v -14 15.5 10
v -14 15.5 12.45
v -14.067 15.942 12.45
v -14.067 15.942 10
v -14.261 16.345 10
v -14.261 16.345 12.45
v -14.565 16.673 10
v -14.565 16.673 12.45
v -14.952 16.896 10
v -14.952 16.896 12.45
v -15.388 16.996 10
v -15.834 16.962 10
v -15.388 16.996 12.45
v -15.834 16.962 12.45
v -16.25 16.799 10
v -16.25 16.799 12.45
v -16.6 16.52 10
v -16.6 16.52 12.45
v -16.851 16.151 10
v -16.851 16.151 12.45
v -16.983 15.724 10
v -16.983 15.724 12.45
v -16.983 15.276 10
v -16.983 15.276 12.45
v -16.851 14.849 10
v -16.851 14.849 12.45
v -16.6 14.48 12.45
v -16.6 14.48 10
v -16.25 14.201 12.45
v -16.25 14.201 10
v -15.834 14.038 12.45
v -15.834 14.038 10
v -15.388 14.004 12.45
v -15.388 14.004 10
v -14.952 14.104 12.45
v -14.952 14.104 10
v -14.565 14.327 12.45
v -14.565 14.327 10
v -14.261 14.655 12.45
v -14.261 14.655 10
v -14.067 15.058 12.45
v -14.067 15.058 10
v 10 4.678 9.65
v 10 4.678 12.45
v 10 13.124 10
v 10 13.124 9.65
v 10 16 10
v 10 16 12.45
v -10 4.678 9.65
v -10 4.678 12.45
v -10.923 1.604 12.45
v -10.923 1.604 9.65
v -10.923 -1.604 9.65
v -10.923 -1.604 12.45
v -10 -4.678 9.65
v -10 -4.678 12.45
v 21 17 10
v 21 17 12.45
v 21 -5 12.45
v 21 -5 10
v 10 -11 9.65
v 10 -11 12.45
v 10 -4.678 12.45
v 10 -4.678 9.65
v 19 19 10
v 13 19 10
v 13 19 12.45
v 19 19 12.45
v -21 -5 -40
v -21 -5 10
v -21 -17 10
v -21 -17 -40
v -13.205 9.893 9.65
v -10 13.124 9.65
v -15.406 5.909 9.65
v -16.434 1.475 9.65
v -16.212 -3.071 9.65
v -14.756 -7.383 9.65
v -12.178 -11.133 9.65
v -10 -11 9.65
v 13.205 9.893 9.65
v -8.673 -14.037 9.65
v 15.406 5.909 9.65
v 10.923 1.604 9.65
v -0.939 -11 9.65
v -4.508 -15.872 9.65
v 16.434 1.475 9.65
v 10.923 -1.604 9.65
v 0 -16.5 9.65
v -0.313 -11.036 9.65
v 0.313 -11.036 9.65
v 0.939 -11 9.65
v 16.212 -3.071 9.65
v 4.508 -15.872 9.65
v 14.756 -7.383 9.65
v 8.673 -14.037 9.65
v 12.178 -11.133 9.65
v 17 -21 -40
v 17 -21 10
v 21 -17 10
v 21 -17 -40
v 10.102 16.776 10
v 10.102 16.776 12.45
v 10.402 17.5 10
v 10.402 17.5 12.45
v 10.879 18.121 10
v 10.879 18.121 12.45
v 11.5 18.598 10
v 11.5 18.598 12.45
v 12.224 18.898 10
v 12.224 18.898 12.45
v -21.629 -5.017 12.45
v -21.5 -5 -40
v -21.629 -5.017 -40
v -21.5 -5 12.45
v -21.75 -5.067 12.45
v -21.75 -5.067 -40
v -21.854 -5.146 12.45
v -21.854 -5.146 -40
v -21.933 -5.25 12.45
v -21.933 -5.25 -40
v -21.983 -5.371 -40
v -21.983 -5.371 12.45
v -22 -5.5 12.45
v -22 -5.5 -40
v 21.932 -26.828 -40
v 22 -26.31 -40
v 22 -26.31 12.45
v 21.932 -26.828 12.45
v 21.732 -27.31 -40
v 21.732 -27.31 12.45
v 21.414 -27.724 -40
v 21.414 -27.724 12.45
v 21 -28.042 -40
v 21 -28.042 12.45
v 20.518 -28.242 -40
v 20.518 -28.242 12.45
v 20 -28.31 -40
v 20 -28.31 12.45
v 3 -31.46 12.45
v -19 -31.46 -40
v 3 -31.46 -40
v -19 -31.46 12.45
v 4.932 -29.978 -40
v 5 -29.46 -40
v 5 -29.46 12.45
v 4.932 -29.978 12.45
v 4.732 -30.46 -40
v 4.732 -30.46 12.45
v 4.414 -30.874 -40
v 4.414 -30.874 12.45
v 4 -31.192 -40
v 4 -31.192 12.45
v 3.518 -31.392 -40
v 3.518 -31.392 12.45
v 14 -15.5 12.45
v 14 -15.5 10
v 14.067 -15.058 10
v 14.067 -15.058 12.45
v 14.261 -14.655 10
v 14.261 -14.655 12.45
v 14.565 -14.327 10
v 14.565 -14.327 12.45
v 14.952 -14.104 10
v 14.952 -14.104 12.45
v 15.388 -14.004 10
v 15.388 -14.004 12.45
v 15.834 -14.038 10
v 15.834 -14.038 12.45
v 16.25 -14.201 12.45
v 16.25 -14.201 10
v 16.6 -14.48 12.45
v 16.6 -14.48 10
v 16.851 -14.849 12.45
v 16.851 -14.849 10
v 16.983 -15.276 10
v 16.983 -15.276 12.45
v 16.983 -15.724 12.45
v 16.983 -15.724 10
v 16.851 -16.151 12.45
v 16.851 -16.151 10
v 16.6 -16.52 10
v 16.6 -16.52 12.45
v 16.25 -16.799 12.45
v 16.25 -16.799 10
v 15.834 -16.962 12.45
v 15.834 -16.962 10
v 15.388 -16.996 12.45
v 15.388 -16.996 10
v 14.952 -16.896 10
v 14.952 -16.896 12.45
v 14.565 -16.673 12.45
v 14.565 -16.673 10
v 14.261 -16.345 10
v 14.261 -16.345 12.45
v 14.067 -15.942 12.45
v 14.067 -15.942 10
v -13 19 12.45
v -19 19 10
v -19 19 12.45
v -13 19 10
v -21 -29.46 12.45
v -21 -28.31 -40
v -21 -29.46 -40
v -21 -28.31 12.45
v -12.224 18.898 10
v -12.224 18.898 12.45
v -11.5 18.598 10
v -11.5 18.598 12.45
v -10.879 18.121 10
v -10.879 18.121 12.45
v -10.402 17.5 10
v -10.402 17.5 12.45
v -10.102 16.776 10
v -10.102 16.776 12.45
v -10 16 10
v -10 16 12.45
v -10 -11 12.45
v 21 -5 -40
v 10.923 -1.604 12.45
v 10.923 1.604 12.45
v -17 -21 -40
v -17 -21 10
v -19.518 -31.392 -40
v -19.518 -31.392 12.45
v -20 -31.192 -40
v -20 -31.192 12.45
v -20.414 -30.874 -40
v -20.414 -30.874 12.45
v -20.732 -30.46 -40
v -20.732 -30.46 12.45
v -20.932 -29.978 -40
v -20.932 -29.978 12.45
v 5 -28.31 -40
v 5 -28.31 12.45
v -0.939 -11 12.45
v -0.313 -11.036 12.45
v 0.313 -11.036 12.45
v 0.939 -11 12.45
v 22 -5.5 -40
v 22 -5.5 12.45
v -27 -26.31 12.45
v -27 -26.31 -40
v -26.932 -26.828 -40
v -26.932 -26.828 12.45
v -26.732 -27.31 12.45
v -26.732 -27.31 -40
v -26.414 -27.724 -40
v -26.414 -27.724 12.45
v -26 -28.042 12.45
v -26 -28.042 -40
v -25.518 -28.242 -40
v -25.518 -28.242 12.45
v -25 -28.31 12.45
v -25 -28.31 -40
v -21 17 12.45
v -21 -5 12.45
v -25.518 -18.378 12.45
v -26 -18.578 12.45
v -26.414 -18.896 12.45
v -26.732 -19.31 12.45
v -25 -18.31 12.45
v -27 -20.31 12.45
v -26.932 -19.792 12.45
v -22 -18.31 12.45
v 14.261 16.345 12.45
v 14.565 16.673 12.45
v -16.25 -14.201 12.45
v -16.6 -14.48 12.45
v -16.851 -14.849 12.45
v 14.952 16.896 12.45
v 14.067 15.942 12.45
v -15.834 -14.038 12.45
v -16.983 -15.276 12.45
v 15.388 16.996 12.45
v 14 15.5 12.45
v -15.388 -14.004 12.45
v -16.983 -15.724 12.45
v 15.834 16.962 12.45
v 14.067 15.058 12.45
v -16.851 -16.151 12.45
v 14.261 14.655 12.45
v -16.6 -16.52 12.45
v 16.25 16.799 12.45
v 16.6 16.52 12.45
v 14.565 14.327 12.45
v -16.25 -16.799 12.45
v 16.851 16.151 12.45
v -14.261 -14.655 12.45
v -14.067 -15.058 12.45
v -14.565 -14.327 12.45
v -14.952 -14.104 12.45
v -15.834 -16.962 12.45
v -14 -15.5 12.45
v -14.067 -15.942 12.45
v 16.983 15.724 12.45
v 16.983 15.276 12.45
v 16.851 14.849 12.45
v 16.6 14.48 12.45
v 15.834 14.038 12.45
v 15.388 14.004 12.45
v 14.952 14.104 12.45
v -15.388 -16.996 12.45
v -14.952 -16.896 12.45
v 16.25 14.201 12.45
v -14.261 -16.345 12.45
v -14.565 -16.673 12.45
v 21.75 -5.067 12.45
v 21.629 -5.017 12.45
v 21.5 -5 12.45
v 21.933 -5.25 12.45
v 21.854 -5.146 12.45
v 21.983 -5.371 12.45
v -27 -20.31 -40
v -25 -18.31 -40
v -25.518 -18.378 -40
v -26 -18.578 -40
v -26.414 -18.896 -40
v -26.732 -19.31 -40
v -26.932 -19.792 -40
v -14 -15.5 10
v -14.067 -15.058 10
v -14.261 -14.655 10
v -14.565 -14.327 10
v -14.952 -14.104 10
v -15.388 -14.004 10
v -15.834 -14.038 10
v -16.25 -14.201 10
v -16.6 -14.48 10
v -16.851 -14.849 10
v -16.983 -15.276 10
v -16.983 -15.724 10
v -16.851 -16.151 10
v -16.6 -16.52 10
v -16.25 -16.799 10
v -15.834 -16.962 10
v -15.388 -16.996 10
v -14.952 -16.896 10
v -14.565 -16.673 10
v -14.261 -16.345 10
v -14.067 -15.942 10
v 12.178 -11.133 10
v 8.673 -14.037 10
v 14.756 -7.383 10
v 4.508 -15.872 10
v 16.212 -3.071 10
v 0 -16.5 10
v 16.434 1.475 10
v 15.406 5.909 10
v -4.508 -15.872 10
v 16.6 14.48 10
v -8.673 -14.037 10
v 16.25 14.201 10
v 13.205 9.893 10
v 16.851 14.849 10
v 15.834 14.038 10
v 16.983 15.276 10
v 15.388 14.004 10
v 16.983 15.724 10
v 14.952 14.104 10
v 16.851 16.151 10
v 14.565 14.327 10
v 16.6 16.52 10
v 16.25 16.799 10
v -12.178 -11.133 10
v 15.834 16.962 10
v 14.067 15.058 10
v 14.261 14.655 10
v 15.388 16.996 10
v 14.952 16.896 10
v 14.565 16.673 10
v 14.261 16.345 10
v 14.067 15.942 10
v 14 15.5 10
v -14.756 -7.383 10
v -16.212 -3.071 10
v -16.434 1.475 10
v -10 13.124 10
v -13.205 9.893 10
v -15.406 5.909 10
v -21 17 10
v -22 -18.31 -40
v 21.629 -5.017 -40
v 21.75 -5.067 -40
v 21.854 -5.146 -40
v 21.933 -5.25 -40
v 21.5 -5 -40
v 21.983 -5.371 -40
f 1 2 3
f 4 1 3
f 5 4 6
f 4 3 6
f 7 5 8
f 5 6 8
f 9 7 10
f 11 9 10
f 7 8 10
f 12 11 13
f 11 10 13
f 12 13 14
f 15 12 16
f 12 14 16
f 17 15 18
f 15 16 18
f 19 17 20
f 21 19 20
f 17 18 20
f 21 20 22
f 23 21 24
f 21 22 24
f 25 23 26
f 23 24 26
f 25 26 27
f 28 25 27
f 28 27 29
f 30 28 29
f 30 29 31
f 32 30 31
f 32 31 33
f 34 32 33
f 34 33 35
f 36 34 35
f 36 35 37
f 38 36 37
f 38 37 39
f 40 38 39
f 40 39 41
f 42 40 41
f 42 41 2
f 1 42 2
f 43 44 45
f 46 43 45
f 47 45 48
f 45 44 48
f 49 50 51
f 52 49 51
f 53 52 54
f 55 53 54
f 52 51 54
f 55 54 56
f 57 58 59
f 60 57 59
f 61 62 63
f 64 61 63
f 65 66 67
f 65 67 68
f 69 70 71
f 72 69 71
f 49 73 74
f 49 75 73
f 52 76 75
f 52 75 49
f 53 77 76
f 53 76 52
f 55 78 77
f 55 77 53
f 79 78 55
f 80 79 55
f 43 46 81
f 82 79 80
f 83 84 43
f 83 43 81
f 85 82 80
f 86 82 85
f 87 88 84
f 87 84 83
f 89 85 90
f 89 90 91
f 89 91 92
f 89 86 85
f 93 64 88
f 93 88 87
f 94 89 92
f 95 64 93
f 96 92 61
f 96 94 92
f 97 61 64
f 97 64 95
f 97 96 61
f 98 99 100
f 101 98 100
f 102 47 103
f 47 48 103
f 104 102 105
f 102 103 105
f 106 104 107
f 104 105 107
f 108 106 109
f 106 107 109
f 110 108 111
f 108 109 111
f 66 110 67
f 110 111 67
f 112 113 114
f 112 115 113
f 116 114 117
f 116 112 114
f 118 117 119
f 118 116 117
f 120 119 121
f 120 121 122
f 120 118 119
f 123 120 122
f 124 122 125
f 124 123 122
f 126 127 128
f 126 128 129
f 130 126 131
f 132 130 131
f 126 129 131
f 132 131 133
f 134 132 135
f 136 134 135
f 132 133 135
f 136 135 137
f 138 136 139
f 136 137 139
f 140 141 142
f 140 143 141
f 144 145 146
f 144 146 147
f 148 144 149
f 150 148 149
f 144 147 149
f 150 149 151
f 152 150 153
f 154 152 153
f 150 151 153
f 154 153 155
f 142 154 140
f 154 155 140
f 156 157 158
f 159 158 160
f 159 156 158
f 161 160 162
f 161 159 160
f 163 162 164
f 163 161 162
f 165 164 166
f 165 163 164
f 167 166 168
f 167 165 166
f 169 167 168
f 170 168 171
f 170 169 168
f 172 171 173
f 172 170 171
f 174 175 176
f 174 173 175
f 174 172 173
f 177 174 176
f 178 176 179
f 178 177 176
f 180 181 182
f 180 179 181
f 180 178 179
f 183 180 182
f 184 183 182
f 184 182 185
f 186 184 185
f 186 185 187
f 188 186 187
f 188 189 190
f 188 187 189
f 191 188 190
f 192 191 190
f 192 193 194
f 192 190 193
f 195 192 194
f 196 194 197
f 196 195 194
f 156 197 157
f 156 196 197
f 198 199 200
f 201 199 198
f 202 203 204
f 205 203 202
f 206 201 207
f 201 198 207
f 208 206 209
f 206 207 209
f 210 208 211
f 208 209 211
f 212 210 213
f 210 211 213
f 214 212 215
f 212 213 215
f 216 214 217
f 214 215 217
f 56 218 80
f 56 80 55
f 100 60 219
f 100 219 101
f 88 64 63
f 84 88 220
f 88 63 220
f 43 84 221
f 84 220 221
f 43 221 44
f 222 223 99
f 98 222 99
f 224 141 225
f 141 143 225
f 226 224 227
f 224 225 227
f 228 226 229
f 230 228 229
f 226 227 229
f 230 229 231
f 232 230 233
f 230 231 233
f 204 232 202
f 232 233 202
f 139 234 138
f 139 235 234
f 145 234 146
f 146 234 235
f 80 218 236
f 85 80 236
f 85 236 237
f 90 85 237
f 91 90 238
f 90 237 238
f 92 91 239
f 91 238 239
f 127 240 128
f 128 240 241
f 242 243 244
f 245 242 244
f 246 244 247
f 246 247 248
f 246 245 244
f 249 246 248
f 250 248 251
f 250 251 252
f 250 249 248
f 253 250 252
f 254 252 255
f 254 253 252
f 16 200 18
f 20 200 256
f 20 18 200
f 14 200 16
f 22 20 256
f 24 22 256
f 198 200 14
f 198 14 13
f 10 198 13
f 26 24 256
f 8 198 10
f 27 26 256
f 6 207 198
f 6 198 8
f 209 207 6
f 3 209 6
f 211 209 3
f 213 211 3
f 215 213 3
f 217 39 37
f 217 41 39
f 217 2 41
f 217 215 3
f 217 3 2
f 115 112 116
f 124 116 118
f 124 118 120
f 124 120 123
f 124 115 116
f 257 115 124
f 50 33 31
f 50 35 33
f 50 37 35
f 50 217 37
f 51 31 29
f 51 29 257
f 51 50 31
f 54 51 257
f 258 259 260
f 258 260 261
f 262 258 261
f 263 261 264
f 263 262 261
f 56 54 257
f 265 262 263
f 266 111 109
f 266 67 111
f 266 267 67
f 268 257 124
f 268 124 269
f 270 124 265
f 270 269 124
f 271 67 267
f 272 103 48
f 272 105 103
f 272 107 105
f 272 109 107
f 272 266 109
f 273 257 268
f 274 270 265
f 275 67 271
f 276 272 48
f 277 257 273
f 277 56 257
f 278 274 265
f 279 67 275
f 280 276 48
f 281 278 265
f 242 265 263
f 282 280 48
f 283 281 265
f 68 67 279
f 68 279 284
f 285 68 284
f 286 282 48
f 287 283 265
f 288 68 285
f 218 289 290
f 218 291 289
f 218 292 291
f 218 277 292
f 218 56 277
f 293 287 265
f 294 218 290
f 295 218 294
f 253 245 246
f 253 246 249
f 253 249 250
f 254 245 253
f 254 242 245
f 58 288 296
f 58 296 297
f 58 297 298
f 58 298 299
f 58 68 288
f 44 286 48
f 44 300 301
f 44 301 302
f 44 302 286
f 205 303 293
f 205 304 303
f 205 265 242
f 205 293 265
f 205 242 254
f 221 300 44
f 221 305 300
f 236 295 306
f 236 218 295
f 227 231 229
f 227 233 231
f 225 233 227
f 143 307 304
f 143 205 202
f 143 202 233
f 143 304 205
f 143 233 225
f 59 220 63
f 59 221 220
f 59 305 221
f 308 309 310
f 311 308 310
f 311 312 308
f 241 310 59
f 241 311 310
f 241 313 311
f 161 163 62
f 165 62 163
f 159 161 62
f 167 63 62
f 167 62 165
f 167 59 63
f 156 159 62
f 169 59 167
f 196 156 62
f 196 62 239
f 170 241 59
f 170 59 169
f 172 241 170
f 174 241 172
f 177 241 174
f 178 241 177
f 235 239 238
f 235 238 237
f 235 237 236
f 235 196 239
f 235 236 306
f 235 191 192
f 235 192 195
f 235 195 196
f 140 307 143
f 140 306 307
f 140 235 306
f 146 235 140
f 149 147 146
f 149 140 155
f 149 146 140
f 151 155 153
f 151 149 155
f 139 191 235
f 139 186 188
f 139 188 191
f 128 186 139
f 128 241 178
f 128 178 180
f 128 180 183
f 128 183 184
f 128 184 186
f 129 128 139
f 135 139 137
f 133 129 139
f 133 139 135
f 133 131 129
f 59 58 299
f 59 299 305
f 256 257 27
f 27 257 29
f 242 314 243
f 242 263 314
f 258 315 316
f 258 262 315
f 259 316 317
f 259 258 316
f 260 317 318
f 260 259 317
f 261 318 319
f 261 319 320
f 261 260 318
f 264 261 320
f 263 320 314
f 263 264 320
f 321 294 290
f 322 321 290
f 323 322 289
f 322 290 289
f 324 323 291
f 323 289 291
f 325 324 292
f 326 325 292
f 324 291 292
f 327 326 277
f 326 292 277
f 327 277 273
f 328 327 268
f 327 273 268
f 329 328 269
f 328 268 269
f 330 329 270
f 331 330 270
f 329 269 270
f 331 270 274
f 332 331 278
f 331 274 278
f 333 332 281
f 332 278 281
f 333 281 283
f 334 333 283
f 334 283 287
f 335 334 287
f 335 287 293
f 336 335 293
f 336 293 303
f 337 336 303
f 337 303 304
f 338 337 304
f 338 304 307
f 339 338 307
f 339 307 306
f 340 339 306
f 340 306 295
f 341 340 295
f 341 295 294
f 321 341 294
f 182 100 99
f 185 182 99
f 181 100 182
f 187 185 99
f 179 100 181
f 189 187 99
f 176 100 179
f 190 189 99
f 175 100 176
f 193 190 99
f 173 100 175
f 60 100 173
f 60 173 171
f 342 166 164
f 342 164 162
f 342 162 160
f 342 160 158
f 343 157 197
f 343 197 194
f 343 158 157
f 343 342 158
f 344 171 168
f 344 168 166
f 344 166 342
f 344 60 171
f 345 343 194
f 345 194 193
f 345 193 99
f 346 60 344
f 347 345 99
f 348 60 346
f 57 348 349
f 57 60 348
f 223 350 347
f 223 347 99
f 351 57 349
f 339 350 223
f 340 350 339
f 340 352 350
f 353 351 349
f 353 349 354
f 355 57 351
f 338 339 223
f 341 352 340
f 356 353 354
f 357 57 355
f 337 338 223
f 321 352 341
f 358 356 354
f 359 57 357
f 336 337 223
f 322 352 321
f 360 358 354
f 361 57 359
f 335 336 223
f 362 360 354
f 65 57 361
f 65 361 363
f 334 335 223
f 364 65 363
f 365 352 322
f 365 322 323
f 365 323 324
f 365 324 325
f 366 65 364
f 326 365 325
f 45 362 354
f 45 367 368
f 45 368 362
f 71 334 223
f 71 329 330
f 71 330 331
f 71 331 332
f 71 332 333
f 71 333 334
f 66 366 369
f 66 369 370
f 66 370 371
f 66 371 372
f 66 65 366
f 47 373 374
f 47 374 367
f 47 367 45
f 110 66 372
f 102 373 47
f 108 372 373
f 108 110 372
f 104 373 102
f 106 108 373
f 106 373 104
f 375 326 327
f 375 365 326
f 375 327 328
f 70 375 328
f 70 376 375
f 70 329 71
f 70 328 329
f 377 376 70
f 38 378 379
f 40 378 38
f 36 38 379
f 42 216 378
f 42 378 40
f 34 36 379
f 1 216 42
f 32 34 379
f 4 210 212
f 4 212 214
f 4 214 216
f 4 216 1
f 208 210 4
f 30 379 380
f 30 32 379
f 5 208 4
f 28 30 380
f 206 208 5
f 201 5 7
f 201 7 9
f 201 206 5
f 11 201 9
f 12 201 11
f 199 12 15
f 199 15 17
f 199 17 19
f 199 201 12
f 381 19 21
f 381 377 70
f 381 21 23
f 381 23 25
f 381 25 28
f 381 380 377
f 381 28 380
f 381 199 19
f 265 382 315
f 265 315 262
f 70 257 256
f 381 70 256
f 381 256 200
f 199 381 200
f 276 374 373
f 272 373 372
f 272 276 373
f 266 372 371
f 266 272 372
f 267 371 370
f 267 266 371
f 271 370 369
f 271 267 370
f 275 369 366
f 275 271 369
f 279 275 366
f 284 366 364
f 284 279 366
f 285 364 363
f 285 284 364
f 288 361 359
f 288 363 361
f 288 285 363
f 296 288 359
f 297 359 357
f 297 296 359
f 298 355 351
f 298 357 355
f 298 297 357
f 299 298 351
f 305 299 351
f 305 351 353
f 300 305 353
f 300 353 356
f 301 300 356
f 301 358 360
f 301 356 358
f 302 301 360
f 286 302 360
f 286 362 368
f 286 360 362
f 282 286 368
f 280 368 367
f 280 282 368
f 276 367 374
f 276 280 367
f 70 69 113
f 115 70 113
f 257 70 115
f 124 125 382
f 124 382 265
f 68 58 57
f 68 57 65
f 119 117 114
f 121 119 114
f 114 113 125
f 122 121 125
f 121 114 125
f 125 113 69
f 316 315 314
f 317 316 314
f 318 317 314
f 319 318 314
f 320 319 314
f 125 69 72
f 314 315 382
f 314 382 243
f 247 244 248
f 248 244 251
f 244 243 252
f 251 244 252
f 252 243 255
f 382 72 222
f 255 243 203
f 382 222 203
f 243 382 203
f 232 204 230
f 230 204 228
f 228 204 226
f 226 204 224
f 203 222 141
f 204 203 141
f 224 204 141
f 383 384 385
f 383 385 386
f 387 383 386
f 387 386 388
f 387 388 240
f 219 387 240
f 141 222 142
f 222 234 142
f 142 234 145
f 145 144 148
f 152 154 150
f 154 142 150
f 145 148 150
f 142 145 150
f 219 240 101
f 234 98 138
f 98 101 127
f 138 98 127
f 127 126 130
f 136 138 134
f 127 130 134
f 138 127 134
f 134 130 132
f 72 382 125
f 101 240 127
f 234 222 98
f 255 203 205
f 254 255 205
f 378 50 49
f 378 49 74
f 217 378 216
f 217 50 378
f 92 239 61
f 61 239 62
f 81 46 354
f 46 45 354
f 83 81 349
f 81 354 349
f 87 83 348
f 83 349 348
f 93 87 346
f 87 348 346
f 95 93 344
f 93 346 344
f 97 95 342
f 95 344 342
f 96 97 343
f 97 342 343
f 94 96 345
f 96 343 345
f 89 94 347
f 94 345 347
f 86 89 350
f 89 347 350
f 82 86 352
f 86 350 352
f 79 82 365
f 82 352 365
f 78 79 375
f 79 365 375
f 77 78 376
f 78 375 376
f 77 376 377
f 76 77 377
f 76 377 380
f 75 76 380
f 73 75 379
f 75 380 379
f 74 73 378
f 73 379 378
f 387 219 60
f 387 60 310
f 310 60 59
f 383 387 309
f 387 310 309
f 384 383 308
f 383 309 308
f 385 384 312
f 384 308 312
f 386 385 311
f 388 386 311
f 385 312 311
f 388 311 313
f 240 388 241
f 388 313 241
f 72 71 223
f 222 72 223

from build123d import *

# Parameters (mm, degrees)
PAD021_DEPTH    = 2.45
PAD022_DEPTH    = 50
SKETCH044_R     = 1.5
POCKET019_DEPTH = 5
SKETCH045_W     = 20
SKETCH045_H     = 52.45
PAD023_DEPTH    = 1
POCKET020_DEPTH = 3
SKETCH047_W     = 26
SKETCH047_H     = 52.45
PAD024_DEPTH    = 6.46
SKETCH048_W     = 17
SKETCH048_H     = 52.45
PAD025_DEPTH    = 3.31
SKETCH049_W     = 1
SKETCH049_H     = 52.45
PAD026_DEPTH    = 3.31
FILLET002_R     = 2
FILLET003_R     = 2
SKETCH050_W     = 10
SKETCH050_H     = 52.45
PAD027_DEPTH    = 5
FILLET004_R     = 2
SKETCH051_R     = 11.04
POCKET021_DEPTH = 5
SKETCH052_R     = 11.04
POCKET022_DEPTH = 5
SKETCH053_R     = 16.5
PAD028_DEPTH    = 0.35
SKETCH054_W     = 20
SKETCH054_H     = 31.6
POCKET023_DEPTH = 5
SKETCH055_R     = 11.04
POCKET024_DEPTH = 5
FILLET005_R     = 3
FILLET006_R     = 0.5


with BuildPart() as part:
    # Sketch041 → Pad021 (new body)
    with BuildSketch(Plane.XY):
        Polygon((-21, 22), (-10, 22), (-10, -8), (10, -8), (10, 22), (21, 22), (21, -22), (-21, -22), align=None)
    extrude(amount=PAD021_DEPTH)

    # Sketch043 (on Face9 of Pad021) → Pad022 (join)
    with BuildSketch(Plane(origin=(0, 0, 0), x_dir=(1, 0, 0), z_dir=(0, 0, -1))):
        Polygon((21, 14), (21, 22), (-21, 22), (-21, 14), (-17, 18), (17, 18), align=None)
    extrude(amount=PAD022_DEPTH)

    # Sketch044 (on Face4 of Pad022) → Pocket019 (cut)
    with BuildSketch(Plane.XY.offset(2.45)):
        with Locations((-15.5, 18.5)):
            Circle(SKETCH044_R)
        with Locations((-15.5, -12.5)):
            Circle(SKETCH044_R)
    pocket019 = extrude(amount=-POCKET019_DEPTH, mode=Mode.SUBTRACT)

    # Mirrored: Pocket019 across Sketch044 V_Axis
    add(pocket019.mirror(Plane(origin=(0, 0, 2.45), x_dir=(0, 0, 1), z_dir=(1, 0, 0))), mode=Mode.SUBTRACT)

    # Sketch045 (on Face13 of Mirrored) → Pad023 (join)
    with BuildSketch(Plane(origin=(-21, 0, 0), x_dir=(0, -1, 0), z_dir=(-1, 0, 0))):
        with Locations((12, -23.775)):
            Rectangle(SKETCH045_W, SKETCH045_H)
    pad023 = extrude(amount=PAD023_DEPTH)

    # Mirrored024: Pad023 across YZ
    add(pad023.mirror(Plane.YZ))

    # Sketch046 (on Face22 of Mirrored024) → Pocket020 (cut)
    with BuildSketch(Plane.XY.offset(2.45)):
        Polygon((-21, 20), (-13.23582, 27.76418), (-21, 27.957458), align=None)
    pocket020 = extrude(amount=-POCKET020_DEPTH, mode=Mode.SUBTRACT)

    # Mirrored025: Pocket020 across Sketch046 V_Axis
    add(pocket020.mirror(Plane(origin=(0, 0, 2.45), x_dir=(0, 0, 1), z_dir=(1, 0, 0))), mode=Mode.SUBTRACT)

    # Sketch047 (on Face13 of Pad022) → Pad024 (join)
    with BuildSketch(Plane.XZ.offset(22)):
        with Locations((-8, -23.775)):
            Rectangle(SKETCH047_W, SKETCH047_H)
    extrude(amount=PAD024_DEPTH)

    # Sketch048 (on Face22 of Pad024) → Pad025 (join)
    with BuildSketch(Plane.XZ.offset(22)):
        with Locations((13.5, -23.775)):
            Rectangle(SKETCH048_W, SKETCH048_H)
    extrude(amount=PAD025_DEPTH)

    # Sketch049 (on Face22 of Pad025) → Pad026 (join)
    with BuildSketch(Plane.XZ.offset(22)):
        with Locations((-21.5, -23.775)):
            Rectangle(SKETCH049_W, SKETCH049_H)
    extrude(amount=PAD026_DEPTH)

    # Fillet002
    fillet002_edges = [part.edges().sort_by_distance(p)[0] for p in [
        (5, -28.46, -23.775),
        (22, -25.31, -23.775),
    ]]
    fillet(fillet002_edges, radius=FILLET002_R)

    # Fillet003
    fillet003_edges = [part.edges().sort_by_distance(p)[0] for p in [
        (-21, -28.46, -23.775),
    ]]
    fillet(fillet003_edges, radius=FILLET003_R)

    # Sketch050 (on Face10 of Fillet003) → Pad027 (join)
    with BuildSketch(Plane(origin=(-22, 0, 0), x_dir=(0, -1, 0), z_dir=(-1, 0, 0))):
        with Locations((20.31, -23.775)):
            Rectangle(SKETCH050_W, SKETCH050_H)
    extrude(amount=PAD027_DEPTH)

    # Fillet004
    fillet004_edges = [part.edges().sort_by_distance(p)[0] for p in [
        (-27, -25.31, -23.775),
        (-27, -15.31, -23.775),
    ]]
    fillet(fillet004_edges, radius=FILLET004_R)

    # Sketch051 (on Face37 of Fillet004) → Pocket021 (cut)
    with BuildSketch(Plane(origin=(0, 0, 0), x_dir=(1, 0, 0), z_dir=(0, 0, -1))):
        with Locations((0, -3)):
            Circle(SKETCH051_R)
    extrude(amount=-POCKET021_DEPTH, mode=Mode.SUBTRACT)

    # Sketch052 (on Face28 of Pad027) → Pocket022 (cut)
    with BuildSketch(Plane(origin=(0, 0, 0), x_dir=(1, 0, 0), z_dir=(0, 0, -1))):
        with Locations((0, -3)):
            Circle(SKETCH052_R)
    extrude(amount=-POCKET022_DEPTH, mode=Mode.SUBTRACT)

    # Sketch053 (on Face42 of Pocket022) → Pad028 (join)
    with BuildSketch(Plane(origin=(0, 0, 0), x_dir=(1, 0, 0), z_dir=(0, 0, -1))):
        with Locations((0, -3)):
            Circle(SKETCH053_R)
    extrude(amount=PAD028_DEPTH)

    # Sketch054 (on Face44 of Pad028) → Pocket023 (cut)
    with BuildSketch(Plane.XY):
        with Locations((0, 7.8)):
            Rectangle(SKETCH054_W, SKETCH054_H)
    extrude(amount=-POCKET023_DEPTH, mode=Mode.SUBTRACT)

    # Sketch055 (on Face5 of Pocket023) → Pocket024 (cut)
    with BuildSketch(Plane.XY.offset(2.45)):
        with Locations((0, 3)):
            Circle(SKETCH055_R)
    extrude(amount=-POCKET024_DEPTH, mode=Mode.SUBTRACT)

    # Fillet005
    fillet005_edges = [part.edges().sort_by_distance(p)[0] for p in [
        (-10, 22, 1.225),
        (10, 22, 1.225),
    ]]
    fillet(fillet005_edges, radius=FILLET005_R)

    # Fillet006
    fillet006_edges = [part.edges().sort_by_distance(p)[0] for p in [
        (22, -2, -23.775),
        (-22, -2, -23.775),
    ]]
    fillet(fillet006_edges, radius=FILLET006_R)


with BuildPart() as part_1:
    # Body006 placement: moved
    add(part.part.moved(Location((0, -3, 10))))


solid = part_1.part
